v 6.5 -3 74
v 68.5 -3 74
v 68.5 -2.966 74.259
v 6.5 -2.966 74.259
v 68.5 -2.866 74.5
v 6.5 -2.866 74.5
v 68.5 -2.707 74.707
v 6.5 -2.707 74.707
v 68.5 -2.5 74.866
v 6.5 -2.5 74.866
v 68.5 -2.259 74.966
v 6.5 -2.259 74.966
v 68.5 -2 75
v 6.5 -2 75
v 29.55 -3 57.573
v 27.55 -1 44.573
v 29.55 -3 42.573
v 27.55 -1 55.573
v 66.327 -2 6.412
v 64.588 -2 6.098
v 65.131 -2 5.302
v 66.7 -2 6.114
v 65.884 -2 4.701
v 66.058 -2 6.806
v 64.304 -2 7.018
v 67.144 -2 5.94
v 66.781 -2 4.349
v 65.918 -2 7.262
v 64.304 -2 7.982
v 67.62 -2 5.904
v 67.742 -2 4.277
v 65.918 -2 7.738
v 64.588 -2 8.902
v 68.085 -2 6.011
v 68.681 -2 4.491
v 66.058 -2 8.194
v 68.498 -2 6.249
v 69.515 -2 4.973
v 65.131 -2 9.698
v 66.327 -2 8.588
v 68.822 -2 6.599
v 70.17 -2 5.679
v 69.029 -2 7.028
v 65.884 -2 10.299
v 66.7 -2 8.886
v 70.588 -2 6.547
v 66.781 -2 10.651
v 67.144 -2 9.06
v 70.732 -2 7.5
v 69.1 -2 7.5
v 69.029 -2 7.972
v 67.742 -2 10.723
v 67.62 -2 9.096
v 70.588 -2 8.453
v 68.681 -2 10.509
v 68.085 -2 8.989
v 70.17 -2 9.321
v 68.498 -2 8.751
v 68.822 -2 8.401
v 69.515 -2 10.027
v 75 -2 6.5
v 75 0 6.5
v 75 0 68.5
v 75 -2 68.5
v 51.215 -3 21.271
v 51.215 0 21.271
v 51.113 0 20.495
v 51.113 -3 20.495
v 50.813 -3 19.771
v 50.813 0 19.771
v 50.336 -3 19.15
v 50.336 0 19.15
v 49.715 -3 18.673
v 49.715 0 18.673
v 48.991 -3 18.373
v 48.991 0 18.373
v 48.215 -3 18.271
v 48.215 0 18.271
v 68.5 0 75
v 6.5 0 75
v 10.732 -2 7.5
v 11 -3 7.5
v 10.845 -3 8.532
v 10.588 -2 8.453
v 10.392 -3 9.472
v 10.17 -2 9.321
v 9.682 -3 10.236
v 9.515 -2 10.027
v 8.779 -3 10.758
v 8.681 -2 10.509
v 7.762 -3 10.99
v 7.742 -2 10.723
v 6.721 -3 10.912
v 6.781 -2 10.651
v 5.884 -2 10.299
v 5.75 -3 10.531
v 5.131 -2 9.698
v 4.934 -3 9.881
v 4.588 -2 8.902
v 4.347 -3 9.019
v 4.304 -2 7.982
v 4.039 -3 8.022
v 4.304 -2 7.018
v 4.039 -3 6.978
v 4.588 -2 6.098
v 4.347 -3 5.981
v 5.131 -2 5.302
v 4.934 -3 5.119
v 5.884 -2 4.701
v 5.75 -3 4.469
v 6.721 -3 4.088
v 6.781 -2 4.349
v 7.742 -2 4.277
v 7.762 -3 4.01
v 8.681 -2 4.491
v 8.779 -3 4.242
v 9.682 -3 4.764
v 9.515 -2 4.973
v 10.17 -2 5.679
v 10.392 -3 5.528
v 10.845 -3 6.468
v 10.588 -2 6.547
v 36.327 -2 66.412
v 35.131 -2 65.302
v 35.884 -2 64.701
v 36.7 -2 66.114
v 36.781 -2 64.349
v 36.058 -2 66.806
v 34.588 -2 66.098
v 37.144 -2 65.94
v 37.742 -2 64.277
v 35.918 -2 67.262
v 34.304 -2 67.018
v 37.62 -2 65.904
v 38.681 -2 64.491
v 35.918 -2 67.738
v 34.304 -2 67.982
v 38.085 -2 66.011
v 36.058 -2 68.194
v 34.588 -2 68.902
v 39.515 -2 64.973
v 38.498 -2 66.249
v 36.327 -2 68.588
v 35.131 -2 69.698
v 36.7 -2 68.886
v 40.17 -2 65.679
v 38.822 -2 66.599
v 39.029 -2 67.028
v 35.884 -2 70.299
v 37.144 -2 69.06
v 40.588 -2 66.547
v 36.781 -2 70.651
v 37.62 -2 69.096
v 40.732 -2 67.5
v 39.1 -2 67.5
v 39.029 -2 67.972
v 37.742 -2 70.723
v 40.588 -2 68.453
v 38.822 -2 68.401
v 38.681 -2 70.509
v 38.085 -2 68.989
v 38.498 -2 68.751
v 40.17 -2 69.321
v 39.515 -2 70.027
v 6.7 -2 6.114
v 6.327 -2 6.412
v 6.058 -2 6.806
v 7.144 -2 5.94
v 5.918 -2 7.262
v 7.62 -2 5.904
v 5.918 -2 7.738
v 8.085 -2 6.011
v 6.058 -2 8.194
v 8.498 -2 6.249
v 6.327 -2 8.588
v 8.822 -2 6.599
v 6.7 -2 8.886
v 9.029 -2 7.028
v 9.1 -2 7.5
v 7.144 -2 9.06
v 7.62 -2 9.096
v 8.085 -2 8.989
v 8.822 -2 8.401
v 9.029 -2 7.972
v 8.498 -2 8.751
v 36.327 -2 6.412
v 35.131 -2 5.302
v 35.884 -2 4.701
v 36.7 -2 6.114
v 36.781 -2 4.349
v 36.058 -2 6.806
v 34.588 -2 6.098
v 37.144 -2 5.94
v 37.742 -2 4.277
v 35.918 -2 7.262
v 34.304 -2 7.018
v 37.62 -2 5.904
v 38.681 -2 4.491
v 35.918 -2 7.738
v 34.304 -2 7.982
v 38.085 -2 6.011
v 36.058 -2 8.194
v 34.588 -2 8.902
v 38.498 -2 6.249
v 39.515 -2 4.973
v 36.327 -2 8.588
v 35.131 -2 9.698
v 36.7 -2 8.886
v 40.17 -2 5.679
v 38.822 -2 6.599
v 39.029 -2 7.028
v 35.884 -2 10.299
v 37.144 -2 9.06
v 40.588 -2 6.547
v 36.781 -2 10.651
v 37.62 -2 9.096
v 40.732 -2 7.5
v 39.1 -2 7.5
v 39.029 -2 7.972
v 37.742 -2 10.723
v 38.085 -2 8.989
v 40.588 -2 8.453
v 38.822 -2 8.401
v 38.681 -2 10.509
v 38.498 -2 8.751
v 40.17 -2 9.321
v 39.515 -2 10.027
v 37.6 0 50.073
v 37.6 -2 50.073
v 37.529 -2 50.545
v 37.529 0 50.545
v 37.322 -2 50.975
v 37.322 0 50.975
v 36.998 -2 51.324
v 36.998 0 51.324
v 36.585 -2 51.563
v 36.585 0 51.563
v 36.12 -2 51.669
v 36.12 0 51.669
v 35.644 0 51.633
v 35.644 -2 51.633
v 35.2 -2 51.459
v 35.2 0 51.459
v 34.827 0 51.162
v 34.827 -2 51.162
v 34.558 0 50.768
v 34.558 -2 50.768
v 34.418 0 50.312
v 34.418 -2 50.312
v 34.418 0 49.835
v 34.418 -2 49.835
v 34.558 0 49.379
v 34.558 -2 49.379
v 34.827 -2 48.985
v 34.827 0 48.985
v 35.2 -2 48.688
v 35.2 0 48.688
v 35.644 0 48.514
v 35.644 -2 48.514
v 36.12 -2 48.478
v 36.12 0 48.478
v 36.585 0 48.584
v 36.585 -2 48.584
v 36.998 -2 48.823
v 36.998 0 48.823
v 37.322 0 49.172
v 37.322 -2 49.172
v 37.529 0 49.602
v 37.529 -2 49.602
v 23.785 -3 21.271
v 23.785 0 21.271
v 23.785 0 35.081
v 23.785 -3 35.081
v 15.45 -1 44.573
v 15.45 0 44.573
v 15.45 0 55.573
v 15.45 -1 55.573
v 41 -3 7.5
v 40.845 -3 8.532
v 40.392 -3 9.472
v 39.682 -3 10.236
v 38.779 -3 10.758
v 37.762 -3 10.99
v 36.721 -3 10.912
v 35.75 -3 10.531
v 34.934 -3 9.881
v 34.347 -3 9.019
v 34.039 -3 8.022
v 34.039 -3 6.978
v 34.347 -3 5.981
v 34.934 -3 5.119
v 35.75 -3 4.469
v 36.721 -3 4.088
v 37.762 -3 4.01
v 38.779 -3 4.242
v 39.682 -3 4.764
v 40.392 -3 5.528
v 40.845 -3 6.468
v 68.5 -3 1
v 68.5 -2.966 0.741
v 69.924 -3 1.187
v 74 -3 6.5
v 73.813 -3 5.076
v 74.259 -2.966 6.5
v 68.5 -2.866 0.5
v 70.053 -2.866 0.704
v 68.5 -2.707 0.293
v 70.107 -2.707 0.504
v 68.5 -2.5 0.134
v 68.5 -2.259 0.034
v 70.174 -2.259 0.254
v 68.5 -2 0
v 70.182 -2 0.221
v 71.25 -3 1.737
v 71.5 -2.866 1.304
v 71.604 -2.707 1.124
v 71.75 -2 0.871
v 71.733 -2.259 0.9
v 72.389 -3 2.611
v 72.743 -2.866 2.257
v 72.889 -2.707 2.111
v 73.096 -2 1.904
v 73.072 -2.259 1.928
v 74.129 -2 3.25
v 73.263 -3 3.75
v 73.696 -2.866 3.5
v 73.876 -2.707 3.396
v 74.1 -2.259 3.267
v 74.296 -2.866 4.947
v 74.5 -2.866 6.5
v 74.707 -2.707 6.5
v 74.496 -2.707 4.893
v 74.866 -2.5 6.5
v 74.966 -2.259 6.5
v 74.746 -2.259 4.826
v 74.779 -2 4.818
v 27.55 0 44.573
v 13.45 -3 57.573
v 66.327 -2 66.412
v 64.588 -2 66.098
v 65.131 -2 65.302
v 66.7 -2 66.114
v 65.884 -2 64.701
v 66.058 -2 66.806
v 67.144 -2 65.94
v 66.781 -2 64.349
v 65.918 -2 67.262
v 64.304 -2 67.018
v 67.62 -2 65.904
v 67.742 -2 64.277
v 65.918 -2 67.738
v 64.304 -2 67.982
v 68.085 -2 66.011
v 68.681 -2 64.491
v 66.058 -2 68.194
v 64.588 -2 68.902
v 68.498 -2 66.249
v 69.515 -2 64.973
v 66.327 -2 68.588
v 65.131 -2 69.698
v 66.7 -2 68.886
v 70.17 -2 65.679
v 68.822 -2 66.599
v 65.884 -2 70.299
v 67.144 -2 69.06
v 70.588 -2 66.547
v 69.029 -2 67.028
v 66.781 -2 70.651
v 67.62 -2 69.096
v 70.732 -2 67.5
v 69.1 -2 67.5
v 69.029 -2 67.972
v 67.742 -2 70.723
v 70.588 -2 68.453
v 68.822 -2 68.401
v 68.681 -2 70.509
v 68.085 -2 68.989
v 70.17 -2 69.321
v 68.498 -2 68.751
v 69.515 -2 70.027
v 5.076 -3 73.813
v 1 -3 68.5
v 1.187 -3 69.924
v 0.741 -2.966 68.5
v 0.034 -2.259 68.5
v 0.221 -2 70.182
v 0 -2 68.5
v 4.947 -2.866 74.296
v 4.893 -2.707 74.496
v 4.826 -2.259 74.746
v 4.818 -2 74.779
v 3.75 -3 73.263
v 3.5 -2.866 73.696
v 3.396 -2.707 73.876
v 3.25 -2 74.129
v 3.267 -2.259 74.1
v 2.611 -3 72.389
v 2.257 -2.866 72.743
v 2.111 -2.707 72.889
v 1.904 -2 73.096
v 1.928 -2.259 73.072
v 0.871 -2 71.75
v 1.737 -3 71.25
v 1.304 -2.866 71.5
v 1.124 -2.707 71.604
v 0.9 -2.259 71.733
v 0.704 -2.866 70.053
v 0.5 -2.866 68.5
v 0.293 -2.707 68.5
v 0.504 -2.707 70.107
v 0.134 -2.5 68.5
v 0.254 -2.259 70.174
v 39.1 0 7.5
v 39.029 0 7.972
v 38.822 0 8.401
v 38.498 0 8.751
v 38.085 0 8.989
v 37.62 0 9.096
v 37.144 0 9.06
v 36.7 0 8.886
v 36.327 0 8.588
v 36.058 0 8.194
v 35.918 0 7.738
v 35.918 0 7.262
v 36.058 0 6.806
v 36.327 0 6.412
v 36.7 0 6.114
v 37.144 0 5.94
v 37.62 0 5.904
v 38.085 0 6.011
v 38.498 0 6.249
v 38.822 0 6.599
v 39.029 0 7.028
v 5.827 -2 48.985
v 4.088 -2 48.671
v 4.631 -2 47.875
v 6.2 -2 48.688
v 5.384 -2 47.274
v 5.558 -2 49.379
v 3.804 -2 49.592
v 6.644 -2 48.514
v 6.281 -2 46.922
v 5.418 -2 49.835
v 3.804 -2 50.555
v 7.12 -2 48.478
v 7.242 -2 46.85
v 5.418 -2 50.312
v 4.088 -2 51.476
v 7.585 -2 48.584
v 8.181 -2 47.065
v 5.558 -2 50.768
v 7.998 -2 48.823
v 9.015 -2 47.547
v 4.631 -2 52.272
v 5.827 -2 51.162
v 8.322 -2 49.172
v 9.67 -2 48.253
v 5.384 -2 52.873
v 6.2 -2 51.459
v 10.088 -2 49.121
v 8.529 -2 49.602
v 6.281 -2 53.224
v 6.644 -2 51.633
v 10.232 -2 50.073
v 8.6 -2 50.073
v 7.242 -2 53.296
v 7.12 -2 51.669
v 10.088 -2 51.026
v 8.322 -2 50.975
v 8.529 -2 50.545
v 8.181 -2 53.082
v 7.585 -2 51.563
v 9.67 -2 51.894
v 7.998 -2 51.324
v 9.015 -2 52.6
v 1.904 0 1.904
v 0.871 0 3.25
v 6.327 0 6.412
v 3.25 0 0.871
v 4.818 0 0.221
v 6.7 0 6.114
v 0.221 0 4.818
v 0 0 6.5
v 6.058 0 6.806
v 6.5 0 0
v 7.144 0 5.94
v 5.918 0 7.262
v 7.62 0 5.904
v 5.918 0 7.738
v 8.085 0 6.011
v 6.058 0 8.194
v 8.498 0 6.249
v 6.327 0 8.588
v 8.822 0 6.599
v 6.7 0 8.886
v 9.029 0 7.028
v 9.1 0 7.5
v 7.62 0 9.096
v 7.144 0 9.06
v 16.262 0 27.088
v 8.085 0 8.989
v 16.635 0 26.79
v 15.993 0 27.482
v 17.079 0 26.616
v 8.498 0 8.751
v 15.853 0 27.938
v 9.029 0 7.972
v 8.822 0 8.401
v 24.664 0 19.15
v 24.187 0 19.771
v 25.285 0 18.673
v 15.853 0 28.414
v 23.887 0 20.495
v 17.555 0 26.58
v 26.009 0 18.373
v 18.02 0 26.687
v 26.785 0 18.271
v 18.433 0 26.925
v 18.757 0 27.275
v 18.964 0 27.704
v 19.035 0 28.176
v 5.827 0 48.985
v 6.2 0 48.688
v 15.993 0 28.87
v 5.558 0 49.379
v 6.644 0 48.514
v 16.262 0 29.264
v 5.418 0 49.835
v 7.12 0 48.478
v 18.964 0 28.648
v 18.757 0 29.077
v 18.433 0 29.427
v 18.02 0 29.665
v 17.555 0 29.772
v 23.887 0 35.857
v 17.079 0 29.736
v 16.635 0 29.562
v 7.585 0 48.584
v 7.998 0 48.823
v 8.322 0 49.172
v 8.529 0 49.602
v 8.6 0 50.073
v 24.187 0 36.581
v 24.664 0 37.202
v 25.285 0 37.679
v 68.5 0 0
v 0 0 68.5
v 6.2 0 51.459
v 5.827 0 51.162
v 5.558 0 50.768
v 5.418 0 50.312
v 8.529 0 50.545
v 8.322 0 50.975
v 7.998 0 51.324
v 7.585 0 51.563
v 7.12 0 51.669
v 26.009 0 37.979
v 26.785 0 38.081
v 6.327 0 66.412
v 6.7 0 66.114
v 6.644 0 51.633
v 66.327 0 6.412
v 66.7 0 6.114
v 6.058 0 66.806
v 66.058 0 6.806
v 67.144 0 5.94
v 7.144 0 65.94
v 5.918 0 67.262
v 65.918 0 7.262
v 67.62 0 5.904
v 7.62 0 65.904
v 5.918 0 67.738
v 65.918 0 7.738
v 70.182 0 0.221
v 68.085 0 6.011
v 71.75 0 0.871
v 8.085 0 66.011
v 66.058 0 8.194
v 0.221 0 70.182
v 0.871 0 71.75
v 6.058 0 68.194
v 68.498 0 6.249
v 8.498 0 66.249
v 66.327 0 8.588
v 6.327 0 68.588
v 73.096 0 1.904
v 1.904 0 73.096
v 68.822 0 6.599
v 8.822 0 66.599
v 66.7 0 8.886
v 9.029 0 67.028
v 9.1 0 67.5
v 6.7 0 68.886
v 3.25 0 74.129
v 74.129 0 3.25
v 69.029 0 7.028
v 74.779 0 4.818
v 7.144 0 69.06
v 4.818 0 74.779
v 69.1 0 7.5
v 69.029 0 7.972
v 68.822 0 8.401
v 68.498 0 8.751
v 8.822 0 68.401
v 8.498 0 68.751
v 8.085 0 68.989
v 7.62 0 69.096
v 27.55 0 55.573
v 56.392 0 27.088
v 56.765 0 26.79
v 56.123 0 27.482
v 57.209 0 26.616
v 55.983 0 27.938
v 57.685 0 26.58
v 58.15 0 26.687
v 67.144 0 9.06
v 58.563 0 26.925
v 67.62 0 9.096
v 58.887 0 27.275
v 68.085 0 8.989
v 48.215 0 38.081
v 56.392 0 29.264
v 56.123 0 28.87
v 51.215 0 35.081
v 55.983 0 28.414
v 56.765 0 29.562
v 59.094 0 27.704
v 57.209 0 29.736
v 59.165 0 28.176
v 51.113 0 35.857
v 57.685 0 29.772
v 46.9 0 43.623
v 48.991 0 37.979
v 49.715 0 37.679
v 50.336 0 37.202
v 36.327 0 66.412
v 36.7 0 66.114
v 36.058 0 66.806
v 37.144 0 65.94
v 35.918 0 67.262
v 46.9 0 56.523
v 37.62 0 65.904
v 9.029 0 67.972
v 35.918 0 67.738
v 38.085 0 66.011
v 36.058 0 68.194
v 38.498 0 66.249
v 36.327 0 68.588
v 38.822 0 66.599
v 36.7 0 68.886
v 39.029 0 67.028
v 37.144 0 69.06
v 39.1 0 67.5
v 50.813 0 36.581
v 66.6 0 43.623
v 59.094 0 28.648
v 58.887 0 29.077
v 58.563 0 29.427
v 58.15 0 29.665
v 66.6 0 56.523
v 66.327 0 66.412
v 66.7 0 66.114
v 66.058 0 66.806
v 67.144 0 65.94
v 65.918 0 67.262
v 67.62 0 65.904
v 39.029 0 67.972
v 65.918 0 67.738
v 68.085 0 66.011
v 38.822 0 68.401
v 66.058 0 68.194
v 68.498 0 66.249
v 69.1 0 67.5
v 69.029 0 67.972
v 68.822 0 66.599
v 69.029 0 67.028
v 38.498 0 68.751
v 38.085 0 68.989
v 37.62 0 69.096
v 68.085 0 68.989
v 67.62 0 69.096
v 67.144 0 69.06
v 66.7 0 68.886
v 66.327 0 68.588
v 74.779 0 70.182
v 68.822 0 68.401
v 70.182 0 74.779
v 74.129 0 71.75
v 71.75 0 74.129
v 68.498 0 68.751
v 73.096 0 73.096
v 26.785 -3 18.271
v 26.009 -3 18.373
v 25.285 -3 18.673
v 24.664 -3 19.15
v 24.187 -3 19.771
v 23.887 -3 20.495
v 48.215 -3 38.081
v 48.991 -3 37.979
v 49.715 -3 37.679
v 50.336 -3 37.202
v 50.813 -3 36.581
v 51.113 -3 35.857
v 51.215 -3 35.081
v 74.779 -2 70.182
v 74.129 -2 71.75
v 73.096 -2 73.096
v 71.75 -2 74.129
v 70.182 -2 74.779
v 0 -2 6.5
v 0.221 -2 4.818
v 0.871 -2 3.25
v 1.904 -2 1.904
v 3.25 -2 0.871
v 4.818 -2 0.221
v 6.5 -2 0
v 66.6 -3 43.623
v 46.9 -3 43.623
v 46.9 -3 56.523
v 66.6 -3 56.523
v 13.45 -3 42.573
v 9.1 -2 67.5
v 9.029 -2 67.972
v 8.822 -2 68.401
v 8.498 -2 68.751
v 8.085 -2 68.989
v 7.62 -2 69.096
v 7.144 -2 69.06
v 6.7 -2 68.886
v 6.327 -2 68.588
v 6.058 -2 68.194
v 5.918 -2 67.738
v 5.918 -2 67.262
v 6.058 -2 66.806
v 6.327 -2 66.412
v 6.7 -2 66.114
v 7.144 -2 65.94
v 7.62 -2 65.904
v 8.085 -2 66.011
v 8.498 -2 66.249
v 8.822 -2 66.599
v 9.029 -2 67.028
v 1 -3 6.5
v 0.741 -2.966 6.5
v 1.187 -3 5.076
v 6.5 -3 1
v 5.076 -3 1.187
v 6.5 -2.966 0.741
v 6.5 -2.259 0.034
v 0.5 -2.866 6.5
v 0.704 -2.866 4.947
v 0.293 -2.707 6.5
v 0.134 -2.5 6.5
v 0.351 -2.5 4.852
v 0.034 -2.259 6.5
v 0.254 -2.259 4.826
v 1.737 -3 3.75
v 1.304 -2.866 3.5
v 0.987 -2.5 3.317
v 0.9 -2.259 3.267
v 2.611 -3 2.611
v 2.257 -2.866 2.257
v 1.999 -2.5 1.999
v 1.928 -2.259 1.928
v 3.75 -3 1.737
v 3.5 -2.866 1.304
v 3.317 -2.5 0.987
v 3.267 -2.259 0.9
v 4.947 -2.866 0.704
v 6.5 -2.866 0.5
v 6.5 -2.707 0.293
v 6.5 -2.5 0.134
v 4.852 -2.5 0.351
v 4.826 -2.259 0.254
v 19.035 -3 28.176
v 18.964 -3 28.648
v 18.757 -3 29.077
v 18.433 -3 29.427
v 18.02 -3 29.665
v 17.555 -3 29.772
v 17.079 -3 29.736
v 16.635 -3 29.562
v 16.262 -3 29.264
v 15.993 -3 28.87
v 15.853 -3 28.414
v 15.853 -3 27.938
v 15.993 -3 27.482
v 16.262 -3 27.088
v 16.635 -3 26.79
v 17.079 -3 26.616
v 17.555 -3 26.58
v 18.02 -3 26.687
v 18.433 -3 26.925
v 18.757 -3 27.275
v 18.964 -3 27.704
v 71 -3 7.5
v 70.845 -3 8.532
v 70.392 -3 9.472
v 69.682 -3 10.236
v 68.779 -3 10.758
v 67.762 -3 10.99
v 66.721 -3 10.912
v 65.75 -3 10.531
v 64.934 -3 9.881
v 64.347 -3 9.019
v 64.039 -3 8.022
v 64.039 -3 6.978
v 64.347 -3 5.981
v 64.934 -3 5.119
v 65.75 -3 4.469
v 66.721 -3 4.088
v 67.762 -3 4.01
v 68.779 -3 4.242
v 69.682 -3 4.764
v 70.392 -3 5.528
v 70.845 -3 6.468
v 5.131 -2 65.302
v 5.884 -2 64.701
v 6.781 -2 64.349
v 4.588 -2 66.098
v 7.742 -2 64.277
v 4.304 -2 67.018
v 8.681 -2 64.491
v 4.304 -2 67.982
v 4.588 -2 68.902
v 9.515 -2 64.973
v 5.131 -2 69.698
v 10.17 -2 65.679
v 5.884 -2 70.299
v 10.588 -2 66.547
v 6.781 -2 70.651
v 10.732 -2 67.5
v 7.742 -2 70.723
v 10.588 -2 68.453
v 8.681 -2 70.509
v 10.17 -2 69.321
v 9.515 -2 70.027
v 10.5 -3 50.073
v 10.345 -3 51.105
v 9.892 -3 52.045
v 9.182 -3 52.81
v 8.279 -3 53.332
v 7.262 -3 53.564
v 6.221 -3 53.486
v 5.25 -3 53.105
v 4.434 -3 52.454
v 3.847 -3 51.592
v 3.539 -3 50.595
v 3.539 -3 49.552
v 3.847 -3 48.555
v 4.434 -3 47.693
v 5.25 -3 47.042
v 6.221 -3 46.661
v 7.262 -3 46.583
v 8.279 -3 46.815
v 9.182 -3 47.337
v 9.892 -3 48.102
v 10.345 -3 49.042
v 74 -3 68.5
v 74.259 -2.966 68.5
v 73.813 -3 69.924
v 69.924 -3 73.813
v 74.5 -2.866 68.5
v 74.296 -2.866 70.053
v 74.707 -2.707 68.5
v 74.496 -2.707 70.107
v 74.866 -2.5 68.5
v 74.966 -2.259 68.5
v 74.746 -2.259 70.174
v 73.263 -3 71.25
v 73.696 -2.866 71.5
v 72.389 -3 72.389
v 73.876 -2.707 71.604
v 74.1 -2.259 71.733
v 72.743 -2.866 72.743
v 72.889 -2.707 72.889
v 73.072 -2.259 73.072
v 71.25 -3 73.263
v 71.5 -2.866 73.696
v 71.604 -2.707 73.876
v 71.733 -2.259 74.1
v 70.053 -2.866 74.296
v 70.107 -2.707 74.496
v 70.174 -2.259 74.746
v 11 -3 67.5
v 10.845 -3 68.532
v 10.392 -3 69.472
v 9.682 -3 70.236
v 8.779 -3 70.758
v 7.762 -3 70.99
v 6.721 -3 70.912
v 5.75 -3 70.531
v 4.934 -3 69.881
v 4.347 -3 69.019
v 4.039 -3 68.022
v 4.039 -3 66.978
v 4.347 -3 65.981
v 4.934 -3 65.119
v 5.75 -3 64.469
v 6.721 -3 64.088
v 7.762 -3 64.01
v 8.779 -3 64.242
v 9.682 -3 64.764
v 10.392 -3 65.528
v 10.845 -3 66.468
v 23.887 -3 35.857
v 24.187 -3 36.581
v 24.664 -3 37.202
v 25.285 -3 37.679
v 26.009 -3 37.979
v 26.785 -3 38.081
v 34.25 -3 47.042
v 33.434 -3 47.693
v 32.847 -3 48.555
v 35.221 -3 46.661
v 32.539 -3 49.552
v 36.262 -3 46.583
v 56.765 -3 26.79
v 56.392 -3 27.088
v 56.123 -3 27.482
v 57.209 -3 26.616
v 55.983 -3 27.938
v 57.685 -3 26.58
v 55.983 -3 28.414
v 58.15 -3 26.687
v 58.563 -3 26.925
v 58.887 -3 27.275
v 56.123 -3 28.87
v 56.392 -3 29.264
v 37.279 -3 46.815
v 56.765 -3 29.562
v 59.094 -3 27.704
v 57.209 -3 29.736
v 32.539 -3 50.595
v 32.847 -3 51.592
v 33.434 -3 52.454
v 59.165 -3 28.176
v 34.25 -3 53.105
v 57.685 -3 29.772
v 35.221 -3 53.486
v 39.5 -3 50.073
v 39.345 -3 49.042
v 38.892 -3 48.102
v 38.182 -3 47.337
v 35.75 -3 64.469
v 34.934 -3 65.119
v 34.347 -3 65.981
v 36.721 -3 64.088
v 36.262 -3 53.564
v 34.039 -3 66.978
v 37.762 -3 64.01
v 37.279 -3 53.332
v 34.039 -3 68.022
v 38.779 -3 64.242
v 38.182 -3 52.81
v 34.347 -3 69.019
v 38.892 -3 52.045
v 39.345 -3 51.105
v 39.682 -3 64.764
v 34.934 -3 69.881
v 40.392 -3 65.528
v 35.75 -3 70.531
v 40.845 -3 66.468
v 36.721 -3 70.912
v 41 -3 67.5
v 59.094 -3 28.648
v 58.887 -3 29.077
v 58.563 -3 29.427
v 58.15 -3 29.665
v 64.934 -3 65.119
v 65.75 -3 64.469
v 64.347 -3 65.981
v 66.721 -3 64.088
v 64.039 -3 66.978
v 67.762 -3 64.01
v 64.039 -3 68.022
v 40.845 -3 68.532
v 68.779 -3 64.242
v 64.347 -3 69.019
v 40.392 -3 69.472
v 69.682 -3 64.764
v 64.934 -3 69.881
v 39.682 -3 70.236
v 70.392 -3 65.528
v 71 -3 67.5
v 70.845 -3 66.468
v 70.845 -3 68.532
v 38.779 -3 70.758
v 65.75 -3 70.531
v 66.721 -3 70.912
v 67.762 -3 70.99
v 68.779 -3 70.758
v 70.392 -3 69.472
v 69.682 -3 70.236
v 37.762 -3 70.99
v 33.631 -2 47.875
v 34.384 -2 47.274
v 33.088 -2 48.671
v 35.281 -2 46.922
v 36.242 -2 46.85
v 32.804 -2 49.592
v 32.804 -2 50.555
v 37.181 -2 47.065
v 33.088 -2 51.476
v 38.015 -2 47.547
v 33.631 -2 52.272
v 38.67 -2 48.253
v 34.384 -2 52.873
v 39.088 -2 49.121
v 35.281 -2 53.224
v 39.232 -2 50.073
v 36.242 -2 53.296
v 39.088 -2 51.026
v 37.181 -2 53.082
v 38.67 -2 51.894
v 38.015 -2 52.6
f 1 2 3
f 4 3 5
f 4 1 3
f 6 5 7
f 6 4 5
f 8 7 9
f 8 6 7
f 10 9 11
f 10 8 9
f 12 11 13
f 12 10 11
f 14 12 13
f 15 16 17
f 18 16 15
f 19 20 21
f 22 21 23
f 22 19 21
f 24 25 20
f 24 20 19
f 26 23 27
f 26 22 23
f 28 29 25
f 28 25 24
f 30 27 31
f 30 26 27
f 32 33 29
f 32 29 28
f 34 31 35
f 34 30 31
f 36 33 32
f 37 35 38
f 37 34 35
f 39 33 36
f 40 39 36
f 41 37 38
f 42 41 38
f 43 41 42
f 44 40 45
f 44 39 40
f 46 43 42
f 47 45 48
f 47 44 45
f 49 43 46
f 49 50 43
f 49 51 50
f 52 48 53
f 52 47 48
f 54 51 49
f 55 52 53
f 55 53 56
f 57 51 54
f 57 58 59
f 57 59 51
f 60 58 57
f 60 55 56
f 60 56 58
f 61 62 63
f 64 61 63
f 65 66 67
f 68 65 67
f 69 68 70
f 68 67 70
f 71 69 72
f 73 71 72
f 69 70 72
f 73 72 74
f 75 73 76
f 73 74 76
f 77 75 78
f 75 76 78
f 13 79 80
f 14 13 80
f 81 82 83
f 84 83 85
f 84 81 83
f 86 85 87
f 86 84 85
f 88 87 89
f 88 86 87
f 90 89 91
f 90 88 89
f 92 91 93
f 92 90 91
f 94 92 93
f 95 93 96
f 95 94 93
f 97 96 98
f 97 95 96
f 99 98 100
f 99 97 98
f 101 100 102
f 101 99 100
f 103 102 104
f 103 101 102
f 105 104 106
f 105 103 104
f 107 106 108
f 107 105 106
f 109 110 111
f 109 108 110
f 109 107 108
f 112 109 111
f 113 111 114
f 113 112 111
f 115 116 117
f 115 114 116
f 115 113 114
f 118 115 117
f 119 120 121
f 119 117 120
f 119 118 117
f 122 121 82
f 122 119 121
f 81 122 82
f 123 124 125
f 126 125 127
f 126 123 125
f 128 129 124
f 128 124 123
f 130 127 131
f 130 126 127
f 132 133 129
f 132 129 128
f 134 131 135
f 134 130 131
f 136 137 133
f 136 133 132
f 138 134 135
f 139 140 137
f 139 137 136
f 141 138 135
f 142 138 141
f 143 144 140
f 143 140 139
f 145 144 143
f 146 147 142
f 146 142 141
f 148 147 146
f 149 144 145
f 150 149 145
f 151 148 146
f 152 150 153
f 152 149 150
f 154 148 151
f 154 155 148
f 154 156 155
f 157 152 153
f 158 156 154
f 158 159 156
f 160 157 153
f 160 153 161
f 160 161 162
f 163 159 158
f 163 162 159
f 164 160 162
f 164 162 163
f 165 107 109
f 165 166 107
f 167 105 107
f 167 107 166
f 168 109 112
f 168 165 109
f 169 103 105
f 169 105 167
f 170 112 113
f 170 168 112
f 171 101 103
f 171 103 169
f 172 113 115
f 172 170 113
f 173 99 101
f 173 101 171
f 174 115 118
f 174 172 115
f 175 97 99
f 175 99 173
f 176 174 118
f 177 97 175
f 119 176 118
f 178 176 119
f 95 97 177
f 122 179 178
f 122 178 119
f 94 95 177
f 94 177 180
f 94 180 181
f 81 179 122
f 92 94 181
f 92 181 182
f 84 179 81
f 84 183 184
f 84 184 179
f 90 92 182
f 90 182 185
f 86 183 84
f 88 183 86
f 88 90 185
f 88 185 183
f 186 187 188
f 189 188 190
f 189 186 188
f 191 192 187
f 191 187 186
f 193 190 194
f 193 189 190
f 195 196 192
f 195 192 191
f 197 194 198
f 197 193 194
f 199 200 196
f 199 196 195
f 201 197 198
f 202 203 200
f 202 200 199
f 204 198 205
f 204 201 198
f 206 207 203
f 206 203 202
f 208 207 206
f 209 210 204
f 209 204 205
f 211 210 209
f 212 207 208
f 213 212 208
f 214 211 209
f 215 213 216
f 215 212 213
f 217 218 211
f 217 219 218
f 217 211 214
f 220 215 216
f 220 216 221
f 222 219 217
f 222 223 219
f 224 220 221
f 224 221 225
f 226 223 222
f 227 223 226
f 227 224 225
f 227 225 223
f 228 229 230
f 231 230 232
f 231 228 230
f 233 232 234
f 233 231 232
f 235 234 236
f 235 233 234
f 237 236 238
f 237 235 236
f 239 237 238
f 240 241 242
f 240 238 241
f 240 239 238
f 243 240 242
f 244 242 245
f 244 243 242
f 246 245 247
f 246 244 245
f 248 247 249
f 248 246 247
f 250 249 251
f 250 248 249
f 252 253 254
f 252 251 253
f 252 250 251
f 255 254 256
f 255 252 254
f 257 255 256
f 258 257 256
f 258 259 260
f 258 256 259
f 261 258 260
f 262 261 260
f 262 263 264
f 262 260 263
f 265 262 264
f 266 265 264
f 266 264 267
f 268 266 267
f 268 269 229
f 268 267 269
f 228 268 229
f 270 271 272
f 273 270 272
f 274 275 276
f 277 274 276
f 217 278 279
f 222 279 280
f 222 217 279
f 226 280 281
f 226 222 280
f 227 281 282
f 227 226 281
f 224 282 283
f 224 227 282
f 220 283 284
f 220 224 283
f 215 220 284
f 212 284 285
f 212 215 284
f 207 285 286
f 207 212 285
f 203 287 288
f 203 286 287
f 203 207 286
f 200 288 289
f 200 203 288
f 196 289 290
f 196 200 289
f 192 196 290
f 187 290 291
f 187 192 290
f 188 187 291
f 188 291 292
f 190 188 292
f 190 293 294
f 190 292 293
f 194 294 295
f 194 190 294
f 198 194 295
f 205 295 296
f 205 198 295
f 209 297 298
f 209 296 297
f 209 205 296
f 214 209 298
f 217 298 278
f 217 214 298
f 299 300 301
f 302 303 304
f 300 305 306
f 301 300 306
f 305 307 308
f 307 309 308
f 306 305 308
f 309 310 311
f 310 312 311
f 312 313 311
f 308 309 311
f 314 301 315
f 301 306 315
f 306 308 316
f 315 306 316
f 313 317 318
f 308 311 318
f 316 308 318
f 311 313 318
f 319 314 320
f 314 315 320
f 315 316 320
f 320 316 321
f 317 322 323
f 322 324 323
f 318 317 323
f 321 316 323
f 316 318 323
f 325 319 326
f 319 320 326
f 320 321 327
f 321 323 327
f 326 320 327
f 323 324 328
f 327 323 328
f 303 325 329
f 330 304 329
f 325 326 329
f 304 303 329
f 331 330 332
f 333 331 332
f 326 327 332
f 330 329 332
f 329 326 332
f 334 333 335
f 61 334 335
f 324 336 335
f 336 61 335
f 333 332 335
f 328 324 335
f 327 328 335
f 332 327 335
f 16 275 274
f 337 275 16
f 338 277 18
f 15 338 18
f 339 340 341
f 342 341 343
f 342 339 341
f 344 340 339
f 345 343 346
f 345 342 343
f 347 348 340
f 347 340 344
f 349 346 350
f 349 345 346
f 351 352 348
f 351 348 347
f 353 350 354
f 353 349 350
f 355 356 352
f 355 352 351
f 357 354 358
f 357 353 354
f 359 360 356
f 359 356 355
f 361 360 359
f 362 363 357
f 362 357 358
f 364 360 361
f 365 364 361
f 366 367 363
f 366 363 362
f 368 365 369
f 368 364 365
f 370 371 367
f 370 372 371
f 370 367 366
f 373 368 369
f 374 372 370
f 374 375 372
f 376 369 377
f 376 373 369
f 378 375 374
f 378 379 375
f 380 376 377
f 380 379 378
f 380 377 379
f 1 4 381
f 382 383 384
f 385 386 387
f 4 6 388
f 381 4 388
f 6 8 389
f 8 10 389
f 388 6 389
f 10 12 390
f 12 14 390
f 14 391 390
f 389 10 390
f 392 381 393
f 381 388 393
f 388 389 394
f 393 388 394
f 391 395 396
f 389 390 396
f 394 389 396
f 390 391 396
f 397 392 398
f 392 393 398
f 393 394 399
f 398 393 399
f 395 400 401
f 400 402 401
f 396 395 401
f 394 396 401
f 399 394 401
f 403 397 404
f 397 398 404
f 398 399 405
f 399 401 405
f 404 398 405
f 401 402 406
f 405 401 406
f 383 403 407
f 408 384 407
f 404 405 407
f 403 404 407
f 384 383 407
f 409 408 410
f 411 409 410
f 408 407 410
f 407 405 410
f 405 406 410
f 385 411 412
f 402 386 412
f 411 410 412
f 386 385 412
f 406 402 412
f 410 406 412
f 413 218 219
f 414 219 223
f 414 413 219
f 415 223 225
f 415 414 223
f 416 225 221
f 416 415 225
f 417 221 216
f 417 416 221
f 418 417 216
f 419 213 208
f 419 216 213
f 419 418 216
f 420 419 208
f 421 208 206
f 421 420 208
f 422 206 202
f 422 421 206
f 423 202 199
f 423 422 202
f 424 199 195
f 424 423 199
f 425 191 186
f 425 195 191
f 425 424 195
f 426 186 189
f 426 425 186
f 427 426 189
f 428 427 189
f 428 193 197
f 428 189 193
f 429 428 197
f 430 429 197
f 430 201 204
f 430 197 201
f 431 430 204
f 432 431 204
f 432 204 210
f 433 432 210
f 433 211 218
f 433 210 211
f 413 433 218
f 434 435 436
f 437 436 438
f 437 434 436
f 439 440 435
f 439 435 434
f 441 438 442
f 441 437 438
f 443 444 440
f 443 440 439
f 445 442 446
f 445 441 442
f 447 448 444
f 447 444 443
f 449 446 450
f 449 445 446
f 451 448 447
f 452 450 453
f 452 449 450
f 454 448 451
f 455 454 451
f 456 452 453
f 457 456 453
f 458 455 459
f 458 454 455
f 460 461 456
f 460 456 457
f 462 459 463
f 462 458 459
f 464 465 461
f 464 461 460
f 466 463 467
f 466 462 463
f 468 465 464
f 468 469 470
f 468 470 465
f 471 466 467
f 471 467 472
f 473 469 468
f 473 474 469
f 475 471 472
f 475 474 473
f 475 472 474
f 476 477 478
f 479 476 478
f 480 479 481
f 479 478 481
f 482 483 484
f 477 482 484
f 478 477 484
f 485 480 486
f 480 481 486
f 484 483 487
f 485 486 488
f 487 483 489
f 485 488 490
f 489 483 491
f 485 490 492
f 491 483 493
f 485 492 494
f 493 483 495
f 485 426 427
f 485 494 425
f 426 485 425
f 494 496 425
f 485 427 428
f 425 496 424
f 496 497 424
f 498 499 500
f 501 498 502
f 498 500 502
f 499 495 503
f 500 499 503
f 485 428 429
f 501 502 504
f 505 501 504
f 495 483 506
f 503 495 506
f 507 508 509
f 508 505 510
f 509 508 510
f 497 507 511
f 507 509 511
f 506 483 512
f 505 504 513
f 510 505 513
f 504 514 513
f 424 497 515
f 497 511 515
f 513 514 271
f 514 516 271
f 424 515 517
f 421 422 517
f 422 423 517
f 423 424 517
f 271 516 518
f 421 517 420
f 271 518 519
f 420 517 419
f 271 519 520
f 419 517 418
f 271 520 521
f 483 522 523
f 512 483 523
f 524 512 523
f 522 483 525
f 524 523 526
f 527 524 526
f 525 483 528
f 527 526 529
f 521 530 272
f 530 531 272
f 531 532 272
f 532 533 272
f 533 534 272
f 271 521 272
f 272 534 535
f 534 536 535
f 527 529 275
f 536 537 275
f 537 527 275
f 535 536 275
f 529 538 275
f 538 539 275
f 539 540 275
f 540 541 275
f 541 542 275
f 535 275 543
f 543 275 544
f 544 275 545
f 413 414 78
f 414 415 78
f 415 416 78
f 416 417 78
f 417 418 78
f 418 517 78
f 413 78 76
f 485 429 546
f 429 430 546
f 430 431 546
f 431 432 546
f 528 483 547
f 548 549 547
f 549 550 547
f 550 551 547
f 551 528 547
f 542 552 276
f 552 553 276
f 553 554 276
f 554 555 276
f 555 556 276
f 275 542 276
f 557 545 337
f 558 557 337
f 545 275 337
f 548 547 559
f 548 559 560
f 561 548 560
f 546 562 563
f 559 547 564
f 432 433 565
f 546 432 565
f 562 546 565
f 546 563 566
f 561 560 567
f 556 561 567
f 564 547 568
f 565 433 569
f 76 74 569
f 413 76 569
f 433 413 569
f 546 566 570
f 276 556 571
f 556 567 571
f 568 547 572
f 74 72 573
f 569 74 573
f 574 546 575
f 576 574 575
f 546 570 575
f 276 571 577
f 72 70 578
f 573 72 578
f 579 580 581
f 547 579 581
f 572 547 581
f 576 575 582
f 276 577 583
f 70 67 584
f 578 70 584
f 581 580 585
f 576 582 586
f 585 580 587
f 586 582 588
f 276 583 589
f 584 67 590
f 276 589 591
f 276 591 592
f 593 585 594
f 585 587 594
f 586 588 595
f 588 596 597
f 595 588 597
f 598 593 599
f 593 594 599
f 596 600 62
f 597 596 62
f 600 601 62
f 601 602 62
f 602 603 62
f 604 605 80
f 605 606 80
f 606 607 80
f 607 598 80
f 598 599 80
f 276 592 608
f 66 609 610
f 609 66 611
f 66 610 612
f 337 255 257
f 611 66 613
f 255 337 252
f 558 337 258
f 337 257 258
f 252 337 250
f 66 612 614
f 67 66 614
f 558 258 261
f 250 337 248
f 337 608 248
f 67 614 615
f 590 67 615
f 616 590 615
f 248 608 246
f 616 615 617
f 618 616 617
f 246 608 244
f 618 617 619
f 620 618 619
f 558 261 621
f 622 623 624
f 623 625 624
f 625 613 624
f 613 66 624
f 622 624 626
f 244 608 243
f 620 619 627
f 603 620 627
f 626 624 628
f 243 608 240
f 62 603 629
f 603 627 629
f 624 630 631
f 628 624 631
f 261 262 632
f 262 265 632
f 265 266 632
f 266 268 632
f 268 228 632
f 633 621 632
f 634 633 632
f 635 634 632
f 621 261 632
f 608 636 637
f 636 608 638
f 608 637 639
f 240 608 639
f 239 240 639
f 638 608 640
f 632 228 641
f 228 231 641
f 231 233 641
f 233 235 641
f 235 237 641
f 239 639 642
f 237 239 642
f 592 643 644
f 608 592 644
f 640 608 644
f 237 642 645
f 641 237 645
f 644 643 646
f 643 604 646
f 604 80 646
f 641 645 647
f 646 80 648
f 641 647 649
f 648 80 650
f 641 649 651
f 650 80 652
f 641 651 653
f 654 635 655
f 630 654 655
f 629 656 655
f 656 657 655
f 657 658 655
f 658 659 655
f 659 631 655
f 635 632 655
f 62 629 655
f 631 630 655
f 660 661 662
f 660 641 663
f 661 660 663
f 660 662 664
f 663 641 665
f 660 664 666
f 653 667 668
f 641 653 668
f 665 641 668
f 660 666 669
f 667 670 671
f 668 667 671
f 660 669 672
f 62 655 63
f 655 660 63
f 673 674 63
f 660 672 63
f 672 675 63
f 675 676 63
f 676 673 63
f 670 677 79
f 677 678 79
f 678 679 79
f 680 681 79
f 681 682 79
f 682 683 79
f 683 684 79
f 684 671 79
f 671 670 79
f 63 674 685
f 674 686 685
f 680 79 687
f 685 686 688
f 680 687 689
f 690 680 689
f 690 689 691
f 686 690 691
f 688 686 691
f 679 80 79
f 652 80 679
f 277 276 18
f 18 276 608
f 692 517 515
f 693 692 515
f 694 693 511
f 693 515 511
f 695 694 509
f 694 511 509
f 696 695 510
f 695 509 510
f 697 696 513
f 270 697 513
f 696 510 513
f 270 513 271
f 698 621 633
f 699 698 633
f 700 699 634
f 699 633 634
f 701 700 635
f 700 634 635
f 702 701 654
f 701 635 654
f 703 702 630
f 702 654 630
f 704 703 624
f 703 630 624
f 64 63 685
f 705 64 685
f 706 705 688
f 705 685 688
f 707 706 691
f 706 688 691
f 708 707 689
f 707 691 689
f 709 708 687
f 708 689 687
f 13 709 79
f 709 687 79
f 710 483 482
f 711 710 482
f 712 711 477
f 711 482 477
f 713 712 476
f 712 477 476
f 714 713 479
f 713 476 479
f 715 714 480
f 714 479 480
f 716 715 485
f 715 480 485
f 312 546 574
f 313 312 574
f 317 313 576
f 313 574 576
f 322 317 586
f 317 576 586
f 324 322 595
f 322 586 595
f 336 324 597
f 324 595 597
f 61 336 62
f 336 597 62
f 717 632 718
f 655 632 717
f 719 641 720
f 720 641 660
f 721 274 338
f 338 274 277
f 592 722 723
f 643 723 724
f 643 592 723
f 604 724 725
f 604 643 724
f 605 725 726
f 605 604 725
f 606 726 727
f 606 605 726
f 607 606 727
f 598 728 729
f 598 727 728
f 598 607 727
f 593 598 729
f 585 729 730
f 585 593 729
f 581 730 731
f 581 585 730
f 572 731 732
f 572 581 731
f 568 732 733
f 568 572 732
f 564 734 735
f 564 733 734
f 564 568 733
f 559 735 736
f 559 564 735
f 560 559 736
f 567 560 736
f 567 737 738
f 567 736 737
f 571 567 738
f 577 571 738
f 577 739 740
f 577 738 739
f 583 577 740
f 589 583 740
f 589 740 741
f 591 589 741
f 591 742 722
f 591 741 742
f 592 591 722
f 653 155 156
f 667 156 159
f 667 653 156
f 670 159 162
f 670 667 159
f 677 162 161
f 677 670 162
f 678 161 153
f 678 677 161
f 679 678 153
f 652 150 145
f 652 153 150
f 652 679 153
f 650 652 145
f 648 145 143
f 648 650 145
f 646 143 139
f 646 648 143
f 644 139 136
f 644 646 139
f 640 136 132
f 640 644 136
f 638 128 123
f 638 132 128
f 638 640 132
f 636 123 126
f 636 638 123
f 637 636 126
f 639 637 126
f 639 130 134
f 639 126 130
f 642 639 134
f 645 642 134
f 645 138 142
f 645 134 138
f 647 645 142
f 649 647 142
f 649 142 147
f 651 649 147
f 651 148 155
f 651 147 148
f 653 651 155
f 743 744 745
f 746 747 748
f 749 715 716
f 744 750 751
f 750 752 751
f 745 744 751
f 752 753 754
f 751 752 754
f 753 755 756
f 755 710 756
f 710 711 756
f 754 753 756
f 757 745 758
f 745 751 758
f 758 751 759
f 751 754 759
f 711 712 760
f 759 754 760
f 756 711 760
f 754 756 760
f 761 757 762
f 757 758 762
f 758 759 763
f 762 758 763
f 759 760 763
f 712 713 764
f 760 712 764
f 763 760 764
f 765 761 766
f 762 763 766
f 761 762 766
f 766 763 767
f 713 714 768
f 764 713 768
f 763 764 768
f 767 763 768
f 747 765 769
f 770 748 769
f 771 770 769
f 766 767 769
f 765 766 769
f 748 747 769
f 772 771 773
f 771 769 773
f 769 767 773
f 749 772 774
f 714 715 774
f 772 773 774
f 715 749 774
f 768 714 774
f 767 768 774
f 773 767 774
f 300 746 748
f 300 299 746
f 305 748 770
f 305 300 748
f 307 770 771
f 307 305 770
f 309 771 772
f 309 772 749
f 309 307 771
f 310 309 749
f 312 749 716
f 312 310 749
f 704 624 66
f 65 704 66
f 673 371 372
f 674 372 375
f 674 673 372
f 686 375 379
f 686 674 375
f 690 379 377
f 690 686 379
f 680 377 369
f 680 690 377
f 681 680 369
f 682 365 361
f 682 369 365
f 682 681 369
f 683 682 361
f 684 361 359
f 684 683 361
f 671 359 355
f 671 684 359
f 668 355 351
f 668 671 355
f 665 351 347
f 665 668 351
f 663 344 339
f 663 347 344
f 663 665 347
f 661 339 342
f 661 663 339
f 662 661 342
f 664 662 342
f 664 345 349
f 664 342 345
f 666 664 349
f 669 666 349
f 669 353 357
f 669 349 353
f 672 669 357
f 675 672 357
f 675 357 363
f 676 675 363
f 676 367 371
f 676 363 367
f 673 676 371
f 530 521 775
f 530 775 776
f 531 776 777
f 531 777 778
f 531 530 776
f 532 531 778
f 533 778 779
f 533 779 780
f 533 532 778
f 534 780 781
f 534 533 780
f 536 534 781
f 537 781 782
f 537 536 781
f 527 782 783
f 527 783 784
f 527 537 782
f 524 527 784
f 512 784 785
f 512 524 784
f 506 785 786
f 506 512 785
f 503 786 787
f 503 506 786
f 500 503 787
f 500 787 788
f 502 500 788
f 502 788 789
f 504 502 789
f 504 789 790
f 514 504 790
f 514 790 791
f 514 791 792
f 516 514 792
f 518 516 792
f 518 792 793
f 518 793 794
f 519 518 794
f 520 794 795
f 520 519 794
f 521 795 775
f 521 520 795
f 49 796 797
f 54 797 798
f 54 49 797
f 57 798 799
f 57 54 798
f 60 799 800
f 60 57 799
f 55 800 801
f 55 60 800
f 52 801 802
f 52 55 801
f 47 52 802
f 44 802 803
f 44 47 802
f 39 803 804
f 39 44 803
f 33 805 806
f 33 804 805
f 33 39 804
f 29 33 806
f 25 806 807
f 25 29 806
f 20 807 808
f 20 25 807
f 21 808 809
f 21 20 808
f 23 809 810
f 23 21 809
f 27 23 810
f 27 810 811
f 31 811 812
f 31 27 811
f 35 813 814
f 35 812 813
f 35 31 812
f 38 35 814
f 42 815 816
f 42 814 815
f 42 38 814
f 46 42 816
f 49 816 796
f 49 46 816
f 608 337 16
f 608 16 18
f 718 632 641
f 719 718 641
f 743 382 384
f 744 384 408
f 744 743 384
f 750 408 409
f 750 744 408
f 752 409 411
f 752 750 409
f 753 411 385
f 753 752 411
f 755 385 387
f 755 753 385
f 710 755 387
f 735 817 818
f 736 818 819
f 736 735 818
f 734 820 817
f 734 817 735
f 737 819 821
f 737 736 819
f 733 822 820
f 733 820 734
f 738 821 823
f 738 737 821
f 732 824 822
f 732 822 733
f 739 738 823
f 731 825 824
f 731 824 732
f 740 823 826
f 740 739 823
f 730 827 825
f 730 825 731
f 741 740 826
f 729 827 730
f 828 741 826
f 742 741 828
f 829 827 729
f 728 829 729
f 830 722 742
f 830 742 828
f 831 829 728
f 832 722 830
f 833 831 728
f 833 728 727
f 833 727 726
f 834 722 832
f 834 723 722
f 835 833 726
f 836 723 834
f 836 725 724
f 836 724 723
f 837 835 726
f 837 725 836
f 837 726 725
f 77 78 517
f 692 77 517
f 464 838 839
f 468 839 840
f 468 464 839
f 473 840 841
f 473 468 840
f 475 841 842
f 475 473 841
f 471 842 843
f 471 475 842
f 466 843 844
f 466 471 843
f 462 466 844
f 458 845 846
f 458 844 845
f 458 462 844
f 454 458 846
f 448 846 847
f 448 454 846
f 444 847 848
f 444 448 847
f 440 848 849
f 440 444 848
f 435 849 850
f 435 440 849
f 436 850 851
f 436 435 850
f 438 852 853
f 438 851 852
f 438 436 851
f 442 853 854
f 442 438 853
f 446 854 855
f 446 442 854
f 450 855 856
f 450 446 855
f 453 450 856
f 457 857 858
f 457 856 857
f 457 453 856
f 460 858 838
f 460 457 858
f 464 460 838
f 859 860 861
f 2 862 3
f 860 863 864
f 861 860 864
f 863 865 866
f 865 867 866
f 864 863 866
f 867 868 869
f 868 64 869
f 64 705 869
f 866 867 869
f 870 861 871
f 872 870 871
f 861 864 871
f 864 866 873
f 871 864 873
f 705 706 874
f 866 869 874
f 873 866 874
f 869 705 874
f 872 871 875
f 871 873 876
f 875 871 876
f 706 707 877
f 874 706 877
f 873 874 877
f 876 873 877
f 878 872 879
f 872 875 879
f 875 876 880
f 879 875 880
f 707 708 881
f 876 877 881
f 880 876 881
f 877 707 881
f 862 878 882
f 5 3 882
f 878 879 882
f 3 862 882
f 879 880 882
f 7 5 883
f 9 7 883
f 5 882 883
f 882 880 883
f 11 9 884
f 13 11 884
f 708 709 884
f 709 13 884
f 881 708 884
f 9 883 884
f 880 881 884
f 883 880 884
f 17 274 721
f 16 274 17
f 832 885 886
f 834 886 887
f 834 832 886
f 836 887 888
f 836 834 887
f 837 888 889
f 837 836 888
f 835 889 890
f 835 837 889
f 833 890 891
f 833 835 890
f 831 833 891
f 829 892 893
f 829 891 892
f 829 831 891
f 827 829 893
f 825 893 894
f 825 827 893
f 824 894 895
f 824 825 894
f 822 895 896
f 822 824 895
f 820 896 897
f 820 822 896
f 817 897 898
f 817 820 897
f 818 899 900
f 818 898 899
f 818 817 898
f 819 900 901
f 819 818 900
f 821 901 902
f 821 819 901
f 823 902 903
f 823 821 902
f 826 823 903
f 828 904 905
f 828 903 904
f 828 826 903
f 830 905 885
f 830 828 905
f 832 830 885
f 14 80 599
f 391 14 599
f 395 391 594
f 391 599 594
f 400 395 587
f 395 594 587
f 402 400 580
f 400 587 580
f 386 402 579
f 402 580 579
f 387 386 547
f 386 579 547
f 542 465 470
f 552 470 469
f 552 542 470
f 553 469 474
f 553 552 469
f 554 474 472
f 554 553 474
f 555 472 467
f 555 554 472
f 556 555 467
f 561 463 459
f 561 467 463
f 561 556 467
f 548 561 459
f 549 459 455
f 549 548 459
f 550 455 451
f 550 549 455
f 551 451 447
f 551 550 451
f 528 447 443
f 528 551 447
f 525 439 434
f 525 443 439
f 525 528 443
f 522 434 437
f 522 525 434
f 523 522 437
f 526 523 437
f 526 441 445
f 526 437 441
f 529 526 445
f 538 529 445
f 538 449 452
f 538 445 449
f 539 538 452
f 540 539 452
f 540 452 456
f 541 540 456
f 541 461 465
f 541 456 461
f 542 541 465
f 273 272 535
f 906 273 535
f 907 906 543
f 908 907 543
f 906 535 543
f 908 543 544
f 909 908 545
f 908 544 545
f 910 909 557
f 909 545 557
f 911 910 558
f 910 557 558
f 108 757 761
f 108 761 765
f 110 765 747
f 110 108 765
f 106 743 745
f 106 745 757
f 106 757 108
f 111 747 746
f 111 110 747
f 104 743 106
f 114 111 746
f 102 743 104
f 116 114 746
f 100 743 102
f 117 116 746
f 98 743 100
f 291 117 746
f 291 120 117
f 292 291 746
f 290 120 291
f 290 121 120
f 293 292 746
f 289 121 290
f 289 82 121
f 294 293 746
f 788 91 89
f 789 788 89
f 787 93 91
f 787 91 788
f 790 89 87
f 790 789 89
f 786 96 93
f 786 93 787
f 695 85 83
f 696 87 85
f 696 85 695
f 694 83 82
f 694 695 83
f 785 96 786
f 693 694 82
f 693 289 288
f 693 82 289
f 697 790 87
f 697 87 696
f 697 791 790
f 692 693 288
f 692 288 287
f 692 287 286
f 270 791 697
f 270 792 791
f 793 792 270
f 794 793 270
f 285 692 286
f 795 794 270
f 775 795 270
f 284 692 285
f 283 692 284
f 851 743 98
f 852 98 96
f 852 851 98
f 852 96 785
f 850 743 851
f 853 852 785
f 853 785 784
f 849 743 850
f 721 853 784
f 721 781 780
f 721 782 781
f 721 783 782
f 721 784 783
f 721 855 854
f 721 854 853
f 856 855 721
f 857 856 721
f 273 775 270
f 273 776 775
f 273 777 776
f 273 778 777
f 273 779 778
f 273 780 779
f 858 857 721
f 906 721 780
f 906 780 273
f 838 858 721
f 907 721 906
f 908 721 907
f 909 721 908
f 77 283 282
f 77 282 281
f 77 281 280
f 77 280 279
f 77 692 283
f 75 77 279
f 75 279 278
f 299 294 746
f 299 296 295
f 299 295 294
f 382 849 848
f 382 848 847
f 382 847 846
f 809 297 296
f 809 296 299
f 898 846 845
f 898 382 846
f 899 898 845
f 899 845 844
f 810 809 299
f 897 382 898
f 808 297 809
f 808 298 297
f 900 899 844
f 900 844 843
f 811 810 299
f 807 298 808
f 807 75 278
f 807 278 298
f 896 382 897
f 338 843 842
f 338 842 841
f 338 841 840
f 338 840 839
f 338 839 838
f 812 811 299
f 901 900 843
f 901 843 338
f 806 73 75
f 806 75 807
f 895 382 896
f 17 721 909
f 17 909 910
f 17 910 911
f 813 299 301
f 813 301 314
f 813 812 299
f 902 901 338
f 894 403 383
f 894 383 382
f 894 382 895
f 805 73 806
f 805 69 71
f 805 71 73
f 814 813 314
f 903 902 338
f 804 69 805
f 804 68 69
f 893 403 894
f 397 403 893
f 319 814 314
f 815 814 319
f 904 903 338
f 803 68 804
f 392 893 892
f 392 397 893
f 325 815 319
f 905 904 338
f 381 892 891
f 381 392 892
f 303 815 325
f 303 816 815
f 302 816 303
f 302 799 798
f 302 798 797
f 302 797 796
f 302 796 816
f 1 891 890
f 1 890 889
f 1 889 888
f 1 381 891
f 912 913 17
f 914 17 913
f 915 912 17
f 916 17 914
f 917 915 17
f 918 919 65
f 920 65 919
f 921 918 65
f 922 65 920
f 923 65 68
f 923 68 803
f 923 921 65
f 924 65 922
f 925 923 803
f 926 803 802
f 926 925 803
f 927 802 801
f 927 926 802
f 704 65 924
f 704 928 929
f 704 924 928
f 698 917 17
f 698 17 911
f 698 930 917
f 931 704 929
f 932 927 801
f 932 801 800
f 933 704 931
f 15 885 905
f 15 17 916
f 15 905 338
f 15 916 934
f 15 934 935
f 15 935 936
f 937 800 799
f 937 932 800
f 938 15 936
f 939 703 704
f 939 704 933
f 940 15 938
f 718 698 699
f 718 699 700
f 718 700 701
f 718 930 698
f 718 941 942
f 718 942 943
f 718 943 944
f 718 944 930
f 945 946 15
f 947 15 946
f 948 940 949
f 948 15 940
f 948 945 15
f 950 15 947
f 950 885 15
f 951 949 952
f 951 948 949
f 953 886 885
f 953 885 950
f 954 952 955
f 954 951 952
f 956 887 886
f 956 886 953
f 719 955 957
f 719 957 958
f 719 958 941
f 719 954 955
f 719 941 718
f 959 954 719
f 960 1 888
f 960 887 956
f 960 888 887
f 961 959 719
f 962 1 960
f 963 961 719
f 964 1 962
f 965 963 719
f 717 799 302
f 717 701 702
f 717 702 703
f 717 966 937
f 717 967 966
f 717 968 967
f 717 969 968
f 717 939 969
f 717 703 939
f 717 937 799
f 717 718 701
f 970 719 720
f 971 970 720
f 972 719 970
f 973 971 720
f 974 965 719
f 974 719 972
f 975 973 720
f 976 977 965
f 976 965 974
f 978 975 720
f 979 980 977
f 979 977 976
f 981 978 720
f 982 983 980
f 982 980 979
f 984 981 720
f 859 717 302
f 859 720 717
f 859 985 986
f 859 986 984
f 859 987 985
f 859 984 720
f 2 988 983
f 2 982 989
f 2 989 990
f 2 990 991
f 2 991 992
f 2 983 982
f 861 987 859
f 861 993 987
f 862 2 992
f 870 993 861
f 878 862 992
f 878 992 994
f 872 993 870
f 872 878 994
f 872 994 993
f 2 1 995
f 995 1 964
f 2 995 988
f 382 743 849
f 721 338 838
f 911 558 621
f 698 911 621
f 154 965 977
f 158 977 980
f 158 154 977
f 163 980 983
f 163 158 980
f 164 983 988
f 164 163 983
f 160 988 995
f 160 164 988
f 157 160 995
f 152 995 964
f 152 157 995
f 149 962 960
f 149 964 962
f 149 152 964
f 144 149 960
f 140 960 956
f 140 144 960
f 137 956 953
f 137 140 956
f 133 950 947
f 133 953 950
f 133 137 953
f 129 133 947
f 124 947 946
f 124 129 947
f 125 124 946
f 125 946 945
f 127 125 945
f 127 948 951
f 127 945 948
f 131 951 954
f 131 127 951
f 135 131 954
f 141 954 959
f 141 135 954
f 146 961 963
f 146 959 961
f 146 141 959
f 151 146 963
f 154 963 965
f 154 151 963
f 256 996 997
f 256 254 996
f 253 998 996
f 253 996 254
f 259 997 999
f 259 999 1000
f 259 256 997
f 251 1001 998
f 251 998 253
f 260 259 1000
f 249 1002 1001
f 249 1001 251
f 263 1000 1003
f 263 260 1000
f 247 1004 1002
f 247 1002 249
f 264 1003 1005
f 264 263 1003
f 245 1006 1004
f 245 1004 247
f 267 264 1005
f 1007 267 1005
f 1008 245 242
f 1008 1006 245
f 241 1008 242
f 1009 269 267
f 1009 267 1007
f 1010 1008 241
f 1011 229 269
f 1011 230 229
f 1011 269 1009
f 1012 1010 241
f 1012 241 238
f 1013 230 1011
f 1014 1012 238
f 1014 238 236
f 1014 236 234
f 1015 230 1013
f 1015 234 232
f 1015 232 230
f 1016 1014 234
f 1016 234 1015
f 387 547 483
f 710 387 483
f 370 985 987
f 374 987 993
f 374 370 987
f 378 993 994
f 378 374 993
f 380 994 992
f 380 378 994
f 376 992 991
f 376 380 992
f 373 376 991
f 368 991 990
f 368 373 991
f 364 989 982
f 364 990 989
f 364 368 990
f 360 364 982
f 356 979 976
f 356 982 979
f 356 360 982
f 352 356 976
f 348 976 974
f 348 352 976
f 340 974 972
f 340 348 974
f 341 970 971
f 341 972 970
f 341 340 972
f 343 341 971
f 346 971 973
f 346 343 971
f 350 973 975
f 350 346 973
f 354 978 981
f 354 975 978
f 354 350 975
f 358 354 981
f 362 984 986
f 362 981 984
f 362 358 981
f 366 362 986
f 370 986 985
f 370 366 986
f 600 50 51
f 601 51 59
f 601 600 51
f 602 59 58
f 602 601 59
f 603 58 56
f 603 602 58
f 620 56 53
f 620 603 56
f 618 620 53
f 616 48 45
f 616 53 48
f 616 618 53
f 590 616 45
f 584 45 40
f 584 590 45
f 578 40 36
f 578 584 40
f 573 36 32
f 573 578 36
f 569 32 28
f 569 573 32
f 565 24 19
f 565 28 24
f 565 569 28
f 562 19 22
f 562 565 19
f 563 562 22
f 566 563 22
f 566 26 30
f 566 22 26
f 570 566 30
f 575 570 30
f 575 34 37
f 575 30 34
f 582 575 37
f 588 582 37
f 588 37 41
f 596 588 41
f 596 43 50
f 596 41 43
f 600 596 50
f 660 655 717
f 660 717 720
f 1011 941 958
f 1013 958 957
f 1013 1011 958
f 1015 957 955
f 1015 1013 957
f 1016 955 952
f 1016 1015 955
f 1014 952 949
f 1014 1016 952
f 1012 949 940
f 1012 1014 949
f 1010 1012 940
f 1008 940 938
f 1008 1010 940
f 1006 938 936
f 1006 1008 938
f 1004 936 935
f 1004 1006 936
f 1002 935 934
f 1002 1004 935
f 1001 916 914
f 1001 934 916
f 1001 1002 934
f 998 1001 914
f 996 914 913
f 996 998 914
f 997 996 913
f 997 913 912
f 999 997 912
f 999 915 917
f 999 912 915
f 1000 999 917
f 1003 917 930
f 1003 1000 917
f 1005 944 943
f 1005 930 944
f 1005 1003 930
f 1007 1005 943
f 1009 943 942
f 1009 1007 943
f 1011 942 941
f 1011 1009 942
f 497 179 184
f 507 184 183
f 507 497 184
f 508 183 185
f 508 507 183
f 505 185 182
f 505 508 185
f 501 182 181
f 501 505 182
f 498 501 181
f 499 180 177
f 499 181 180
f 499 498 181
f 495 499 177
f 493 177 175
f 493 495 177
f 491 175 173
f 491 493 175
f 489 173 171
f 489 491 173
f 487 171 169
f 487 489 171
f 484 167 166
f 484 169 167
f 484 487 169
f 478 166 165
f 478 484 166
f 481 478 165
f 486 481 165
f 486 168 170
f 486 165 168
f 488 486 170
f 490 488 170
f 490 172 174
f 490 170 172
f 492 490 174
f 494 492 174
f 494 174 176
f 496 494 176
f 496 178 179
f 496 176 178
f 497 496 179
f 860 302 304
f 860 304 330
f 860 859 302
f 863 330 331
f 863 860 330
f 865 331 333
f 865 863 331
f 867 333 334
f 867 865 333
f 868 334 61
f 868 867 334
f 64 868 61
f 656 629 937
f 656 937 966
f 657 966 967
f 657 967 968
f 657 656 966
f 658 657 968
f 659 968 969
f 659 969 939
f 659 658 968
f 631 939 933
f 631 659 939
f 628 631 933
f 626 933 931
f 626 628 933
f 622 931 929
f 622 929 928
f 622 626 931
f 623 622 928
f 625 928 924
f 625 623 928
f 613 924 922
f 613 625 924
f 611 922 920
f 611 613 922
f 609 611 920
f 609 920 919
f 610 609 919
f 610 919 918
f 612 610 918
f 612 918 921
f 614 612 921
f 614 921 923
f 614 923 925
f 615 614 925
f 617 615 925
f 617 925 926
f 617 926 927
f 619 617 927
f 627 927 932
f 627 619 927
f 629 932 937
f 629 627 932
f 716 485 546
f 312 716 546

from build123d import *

# Parameters (mm, degrees)
F0_R     = 1.6
F0_W     = 12.1
F0_H     = 11
F0_W_2   = 19.7
F0_H_2   = 12.9
F1_DEPTH = 3
F2_R     = 3.5
F3_DEPTH = 1
F3_TAPER = 15
F4_R     = 1
F5_SIZE  = 2


with BuildPart() as f1:
    # F0 (on Front) → F1 (new body)
    with BuildSketch(Plane.XZ):
        with BuildLine():
            Line((68.5, 75), (6.5, 75))
            ThreePointArc((6.5, 75), (1.9038059223, 73.0961940777), (0, 68.5))
            Line((0, 68.5), (0, 6.5))
            ThreePointArc((0, 6.5), (1.9038059223, 1.9038059223), (6.5, 0))
            Line((6.5, 0), (68.5, 0))
            ThreePointArc((68.5, 0), (73.0961940777, 1.9038059223), (75, 6.5))
            Line((75, 6.5), (75, 68.5))
            ThreePointArc((75, 68.5), (73.0961940777, 73.0961940777), (68.5, 75))
        make_face()
        with Locations((7.5, 7.5)):
            Circle(F0_R, mode=Mode.SUBTRACT)
        with Locations((17.435, 28.1759891631)):
            Circle(F0_R, mode=Mode.SUBTRACT)
        with Locations((37.5, 7.5)):
            Circle(F0_R, mode=Mode.SUBTRACT)
        with Locations((67.5, 7.5)):
            Circle(F0_R, mode=Mode.SUBTRACT)
        with BuildLine():
            Line((26.785, 38.0809891631), (48.215, 38.0809891631))
            ThreePointArc((48.215, 38.0809891631), (50.3363203436, 37.2023095066), (51.215, 35.0809891631))
            Line((51.215, 35.0809891631), (51.215, 21.2709891631))
            ThreePointArc((51.215, 21.2709891631), (50.3363203436, 19.1496688195), (48.215, 18.2709891631))
            Line((48.215, 18.2709891631), (26.785, 18.2709891631))
            ThreePointArc((26.785, 18.2709891631), (24.6636796564, 19.1496688195), (23.785, 21.2709891631))
            Line((23.785, 21.2709891631), (23.785, 35.0809891631))
            ThreePointArc((23.785, 35.0809891631), (24.6636796564, 37.2023095066), (26.785, 38.0809891631))
        make_face(mode=Mode.SUBTRACT)
        with Locations((57.565, 28.1759891631)):
            Circle(F0_R, mode=Mode.SUBTRACT)
        with Locations((7, 50.0734709203)):
            Circle(F0_R, mode=Mode.SUBTRACT)
        with Locations((21.5, 50.0734709203)):
            Rectangle(F0_W, F0_H, mode=Mode.SUBTRACT)
        with Locations((36, 50.0734709203)):
            Circle(F0_R, mode=Mode.SUBTRACT)
        with Locations((7.5, 67.5)):
            Circle(F0_R, mode=Mode.SUBTRACT)
        with Locations((56.75, 50.0734709203)):
            Rectangle(F0_W_2, F0_H_2, mode=Mode.SUBTRACT)
        with Locations((37.5, 67.5)):
            Circle(F0_R, mode=Mode.SUBTRACT)
        with Locations((67.5, 67.5)):
            Circle(F0_R, mode=Mode.SUBTRACT)
    extrude(amount=F1_DEPTH)

    # F2 (on face) → F3 (cut)
    with BuildSketch(Plane.XZ.offset(3)):
        with Locations((7.5, 67.5)):
            Circle(F2_R)
        with Locations((37.5, 67.5)):
            Circle(F2_R)
        with Locations((67.5, 67.5)):
            Circle(F2_R)
        with Locations((36, 50.0734709203)):
            Circle(F2_R)
        with Locations((7, 50.0734709203)):
            Circle(F2_R)
        with Locations((67.5, 7.5)):
            Circle(F2_R)
        with Locations((37.5, 7.5)):
            Circle(F2_R)
        with Locations((7.5, 7.5)):
            Circle(F2_R)
    extrude(amount=-F3_DEPTH, taper=F3_TAPER, mode=Mode.SUBTRACT)

    # F4
    f4_edges = [f1.edges().sort_by_distance(p)[0] for p in [
        (37.5, -3, 0),
    ]]
    fillet(f4_edges, radius=F4_R)

    # F5
    f5_edges = [f1.edges().sort_by_distance(p)[0] for p in [
        (21.5, -3, 55.573471),
        (27.55, -3, 50.073471),
        (21.5, -3, 44.573471),
        (15.45, -3, 50.073471),
    ]]
    chamfer(f5_edges, length=F5_SIZE)


solid = f1.part
